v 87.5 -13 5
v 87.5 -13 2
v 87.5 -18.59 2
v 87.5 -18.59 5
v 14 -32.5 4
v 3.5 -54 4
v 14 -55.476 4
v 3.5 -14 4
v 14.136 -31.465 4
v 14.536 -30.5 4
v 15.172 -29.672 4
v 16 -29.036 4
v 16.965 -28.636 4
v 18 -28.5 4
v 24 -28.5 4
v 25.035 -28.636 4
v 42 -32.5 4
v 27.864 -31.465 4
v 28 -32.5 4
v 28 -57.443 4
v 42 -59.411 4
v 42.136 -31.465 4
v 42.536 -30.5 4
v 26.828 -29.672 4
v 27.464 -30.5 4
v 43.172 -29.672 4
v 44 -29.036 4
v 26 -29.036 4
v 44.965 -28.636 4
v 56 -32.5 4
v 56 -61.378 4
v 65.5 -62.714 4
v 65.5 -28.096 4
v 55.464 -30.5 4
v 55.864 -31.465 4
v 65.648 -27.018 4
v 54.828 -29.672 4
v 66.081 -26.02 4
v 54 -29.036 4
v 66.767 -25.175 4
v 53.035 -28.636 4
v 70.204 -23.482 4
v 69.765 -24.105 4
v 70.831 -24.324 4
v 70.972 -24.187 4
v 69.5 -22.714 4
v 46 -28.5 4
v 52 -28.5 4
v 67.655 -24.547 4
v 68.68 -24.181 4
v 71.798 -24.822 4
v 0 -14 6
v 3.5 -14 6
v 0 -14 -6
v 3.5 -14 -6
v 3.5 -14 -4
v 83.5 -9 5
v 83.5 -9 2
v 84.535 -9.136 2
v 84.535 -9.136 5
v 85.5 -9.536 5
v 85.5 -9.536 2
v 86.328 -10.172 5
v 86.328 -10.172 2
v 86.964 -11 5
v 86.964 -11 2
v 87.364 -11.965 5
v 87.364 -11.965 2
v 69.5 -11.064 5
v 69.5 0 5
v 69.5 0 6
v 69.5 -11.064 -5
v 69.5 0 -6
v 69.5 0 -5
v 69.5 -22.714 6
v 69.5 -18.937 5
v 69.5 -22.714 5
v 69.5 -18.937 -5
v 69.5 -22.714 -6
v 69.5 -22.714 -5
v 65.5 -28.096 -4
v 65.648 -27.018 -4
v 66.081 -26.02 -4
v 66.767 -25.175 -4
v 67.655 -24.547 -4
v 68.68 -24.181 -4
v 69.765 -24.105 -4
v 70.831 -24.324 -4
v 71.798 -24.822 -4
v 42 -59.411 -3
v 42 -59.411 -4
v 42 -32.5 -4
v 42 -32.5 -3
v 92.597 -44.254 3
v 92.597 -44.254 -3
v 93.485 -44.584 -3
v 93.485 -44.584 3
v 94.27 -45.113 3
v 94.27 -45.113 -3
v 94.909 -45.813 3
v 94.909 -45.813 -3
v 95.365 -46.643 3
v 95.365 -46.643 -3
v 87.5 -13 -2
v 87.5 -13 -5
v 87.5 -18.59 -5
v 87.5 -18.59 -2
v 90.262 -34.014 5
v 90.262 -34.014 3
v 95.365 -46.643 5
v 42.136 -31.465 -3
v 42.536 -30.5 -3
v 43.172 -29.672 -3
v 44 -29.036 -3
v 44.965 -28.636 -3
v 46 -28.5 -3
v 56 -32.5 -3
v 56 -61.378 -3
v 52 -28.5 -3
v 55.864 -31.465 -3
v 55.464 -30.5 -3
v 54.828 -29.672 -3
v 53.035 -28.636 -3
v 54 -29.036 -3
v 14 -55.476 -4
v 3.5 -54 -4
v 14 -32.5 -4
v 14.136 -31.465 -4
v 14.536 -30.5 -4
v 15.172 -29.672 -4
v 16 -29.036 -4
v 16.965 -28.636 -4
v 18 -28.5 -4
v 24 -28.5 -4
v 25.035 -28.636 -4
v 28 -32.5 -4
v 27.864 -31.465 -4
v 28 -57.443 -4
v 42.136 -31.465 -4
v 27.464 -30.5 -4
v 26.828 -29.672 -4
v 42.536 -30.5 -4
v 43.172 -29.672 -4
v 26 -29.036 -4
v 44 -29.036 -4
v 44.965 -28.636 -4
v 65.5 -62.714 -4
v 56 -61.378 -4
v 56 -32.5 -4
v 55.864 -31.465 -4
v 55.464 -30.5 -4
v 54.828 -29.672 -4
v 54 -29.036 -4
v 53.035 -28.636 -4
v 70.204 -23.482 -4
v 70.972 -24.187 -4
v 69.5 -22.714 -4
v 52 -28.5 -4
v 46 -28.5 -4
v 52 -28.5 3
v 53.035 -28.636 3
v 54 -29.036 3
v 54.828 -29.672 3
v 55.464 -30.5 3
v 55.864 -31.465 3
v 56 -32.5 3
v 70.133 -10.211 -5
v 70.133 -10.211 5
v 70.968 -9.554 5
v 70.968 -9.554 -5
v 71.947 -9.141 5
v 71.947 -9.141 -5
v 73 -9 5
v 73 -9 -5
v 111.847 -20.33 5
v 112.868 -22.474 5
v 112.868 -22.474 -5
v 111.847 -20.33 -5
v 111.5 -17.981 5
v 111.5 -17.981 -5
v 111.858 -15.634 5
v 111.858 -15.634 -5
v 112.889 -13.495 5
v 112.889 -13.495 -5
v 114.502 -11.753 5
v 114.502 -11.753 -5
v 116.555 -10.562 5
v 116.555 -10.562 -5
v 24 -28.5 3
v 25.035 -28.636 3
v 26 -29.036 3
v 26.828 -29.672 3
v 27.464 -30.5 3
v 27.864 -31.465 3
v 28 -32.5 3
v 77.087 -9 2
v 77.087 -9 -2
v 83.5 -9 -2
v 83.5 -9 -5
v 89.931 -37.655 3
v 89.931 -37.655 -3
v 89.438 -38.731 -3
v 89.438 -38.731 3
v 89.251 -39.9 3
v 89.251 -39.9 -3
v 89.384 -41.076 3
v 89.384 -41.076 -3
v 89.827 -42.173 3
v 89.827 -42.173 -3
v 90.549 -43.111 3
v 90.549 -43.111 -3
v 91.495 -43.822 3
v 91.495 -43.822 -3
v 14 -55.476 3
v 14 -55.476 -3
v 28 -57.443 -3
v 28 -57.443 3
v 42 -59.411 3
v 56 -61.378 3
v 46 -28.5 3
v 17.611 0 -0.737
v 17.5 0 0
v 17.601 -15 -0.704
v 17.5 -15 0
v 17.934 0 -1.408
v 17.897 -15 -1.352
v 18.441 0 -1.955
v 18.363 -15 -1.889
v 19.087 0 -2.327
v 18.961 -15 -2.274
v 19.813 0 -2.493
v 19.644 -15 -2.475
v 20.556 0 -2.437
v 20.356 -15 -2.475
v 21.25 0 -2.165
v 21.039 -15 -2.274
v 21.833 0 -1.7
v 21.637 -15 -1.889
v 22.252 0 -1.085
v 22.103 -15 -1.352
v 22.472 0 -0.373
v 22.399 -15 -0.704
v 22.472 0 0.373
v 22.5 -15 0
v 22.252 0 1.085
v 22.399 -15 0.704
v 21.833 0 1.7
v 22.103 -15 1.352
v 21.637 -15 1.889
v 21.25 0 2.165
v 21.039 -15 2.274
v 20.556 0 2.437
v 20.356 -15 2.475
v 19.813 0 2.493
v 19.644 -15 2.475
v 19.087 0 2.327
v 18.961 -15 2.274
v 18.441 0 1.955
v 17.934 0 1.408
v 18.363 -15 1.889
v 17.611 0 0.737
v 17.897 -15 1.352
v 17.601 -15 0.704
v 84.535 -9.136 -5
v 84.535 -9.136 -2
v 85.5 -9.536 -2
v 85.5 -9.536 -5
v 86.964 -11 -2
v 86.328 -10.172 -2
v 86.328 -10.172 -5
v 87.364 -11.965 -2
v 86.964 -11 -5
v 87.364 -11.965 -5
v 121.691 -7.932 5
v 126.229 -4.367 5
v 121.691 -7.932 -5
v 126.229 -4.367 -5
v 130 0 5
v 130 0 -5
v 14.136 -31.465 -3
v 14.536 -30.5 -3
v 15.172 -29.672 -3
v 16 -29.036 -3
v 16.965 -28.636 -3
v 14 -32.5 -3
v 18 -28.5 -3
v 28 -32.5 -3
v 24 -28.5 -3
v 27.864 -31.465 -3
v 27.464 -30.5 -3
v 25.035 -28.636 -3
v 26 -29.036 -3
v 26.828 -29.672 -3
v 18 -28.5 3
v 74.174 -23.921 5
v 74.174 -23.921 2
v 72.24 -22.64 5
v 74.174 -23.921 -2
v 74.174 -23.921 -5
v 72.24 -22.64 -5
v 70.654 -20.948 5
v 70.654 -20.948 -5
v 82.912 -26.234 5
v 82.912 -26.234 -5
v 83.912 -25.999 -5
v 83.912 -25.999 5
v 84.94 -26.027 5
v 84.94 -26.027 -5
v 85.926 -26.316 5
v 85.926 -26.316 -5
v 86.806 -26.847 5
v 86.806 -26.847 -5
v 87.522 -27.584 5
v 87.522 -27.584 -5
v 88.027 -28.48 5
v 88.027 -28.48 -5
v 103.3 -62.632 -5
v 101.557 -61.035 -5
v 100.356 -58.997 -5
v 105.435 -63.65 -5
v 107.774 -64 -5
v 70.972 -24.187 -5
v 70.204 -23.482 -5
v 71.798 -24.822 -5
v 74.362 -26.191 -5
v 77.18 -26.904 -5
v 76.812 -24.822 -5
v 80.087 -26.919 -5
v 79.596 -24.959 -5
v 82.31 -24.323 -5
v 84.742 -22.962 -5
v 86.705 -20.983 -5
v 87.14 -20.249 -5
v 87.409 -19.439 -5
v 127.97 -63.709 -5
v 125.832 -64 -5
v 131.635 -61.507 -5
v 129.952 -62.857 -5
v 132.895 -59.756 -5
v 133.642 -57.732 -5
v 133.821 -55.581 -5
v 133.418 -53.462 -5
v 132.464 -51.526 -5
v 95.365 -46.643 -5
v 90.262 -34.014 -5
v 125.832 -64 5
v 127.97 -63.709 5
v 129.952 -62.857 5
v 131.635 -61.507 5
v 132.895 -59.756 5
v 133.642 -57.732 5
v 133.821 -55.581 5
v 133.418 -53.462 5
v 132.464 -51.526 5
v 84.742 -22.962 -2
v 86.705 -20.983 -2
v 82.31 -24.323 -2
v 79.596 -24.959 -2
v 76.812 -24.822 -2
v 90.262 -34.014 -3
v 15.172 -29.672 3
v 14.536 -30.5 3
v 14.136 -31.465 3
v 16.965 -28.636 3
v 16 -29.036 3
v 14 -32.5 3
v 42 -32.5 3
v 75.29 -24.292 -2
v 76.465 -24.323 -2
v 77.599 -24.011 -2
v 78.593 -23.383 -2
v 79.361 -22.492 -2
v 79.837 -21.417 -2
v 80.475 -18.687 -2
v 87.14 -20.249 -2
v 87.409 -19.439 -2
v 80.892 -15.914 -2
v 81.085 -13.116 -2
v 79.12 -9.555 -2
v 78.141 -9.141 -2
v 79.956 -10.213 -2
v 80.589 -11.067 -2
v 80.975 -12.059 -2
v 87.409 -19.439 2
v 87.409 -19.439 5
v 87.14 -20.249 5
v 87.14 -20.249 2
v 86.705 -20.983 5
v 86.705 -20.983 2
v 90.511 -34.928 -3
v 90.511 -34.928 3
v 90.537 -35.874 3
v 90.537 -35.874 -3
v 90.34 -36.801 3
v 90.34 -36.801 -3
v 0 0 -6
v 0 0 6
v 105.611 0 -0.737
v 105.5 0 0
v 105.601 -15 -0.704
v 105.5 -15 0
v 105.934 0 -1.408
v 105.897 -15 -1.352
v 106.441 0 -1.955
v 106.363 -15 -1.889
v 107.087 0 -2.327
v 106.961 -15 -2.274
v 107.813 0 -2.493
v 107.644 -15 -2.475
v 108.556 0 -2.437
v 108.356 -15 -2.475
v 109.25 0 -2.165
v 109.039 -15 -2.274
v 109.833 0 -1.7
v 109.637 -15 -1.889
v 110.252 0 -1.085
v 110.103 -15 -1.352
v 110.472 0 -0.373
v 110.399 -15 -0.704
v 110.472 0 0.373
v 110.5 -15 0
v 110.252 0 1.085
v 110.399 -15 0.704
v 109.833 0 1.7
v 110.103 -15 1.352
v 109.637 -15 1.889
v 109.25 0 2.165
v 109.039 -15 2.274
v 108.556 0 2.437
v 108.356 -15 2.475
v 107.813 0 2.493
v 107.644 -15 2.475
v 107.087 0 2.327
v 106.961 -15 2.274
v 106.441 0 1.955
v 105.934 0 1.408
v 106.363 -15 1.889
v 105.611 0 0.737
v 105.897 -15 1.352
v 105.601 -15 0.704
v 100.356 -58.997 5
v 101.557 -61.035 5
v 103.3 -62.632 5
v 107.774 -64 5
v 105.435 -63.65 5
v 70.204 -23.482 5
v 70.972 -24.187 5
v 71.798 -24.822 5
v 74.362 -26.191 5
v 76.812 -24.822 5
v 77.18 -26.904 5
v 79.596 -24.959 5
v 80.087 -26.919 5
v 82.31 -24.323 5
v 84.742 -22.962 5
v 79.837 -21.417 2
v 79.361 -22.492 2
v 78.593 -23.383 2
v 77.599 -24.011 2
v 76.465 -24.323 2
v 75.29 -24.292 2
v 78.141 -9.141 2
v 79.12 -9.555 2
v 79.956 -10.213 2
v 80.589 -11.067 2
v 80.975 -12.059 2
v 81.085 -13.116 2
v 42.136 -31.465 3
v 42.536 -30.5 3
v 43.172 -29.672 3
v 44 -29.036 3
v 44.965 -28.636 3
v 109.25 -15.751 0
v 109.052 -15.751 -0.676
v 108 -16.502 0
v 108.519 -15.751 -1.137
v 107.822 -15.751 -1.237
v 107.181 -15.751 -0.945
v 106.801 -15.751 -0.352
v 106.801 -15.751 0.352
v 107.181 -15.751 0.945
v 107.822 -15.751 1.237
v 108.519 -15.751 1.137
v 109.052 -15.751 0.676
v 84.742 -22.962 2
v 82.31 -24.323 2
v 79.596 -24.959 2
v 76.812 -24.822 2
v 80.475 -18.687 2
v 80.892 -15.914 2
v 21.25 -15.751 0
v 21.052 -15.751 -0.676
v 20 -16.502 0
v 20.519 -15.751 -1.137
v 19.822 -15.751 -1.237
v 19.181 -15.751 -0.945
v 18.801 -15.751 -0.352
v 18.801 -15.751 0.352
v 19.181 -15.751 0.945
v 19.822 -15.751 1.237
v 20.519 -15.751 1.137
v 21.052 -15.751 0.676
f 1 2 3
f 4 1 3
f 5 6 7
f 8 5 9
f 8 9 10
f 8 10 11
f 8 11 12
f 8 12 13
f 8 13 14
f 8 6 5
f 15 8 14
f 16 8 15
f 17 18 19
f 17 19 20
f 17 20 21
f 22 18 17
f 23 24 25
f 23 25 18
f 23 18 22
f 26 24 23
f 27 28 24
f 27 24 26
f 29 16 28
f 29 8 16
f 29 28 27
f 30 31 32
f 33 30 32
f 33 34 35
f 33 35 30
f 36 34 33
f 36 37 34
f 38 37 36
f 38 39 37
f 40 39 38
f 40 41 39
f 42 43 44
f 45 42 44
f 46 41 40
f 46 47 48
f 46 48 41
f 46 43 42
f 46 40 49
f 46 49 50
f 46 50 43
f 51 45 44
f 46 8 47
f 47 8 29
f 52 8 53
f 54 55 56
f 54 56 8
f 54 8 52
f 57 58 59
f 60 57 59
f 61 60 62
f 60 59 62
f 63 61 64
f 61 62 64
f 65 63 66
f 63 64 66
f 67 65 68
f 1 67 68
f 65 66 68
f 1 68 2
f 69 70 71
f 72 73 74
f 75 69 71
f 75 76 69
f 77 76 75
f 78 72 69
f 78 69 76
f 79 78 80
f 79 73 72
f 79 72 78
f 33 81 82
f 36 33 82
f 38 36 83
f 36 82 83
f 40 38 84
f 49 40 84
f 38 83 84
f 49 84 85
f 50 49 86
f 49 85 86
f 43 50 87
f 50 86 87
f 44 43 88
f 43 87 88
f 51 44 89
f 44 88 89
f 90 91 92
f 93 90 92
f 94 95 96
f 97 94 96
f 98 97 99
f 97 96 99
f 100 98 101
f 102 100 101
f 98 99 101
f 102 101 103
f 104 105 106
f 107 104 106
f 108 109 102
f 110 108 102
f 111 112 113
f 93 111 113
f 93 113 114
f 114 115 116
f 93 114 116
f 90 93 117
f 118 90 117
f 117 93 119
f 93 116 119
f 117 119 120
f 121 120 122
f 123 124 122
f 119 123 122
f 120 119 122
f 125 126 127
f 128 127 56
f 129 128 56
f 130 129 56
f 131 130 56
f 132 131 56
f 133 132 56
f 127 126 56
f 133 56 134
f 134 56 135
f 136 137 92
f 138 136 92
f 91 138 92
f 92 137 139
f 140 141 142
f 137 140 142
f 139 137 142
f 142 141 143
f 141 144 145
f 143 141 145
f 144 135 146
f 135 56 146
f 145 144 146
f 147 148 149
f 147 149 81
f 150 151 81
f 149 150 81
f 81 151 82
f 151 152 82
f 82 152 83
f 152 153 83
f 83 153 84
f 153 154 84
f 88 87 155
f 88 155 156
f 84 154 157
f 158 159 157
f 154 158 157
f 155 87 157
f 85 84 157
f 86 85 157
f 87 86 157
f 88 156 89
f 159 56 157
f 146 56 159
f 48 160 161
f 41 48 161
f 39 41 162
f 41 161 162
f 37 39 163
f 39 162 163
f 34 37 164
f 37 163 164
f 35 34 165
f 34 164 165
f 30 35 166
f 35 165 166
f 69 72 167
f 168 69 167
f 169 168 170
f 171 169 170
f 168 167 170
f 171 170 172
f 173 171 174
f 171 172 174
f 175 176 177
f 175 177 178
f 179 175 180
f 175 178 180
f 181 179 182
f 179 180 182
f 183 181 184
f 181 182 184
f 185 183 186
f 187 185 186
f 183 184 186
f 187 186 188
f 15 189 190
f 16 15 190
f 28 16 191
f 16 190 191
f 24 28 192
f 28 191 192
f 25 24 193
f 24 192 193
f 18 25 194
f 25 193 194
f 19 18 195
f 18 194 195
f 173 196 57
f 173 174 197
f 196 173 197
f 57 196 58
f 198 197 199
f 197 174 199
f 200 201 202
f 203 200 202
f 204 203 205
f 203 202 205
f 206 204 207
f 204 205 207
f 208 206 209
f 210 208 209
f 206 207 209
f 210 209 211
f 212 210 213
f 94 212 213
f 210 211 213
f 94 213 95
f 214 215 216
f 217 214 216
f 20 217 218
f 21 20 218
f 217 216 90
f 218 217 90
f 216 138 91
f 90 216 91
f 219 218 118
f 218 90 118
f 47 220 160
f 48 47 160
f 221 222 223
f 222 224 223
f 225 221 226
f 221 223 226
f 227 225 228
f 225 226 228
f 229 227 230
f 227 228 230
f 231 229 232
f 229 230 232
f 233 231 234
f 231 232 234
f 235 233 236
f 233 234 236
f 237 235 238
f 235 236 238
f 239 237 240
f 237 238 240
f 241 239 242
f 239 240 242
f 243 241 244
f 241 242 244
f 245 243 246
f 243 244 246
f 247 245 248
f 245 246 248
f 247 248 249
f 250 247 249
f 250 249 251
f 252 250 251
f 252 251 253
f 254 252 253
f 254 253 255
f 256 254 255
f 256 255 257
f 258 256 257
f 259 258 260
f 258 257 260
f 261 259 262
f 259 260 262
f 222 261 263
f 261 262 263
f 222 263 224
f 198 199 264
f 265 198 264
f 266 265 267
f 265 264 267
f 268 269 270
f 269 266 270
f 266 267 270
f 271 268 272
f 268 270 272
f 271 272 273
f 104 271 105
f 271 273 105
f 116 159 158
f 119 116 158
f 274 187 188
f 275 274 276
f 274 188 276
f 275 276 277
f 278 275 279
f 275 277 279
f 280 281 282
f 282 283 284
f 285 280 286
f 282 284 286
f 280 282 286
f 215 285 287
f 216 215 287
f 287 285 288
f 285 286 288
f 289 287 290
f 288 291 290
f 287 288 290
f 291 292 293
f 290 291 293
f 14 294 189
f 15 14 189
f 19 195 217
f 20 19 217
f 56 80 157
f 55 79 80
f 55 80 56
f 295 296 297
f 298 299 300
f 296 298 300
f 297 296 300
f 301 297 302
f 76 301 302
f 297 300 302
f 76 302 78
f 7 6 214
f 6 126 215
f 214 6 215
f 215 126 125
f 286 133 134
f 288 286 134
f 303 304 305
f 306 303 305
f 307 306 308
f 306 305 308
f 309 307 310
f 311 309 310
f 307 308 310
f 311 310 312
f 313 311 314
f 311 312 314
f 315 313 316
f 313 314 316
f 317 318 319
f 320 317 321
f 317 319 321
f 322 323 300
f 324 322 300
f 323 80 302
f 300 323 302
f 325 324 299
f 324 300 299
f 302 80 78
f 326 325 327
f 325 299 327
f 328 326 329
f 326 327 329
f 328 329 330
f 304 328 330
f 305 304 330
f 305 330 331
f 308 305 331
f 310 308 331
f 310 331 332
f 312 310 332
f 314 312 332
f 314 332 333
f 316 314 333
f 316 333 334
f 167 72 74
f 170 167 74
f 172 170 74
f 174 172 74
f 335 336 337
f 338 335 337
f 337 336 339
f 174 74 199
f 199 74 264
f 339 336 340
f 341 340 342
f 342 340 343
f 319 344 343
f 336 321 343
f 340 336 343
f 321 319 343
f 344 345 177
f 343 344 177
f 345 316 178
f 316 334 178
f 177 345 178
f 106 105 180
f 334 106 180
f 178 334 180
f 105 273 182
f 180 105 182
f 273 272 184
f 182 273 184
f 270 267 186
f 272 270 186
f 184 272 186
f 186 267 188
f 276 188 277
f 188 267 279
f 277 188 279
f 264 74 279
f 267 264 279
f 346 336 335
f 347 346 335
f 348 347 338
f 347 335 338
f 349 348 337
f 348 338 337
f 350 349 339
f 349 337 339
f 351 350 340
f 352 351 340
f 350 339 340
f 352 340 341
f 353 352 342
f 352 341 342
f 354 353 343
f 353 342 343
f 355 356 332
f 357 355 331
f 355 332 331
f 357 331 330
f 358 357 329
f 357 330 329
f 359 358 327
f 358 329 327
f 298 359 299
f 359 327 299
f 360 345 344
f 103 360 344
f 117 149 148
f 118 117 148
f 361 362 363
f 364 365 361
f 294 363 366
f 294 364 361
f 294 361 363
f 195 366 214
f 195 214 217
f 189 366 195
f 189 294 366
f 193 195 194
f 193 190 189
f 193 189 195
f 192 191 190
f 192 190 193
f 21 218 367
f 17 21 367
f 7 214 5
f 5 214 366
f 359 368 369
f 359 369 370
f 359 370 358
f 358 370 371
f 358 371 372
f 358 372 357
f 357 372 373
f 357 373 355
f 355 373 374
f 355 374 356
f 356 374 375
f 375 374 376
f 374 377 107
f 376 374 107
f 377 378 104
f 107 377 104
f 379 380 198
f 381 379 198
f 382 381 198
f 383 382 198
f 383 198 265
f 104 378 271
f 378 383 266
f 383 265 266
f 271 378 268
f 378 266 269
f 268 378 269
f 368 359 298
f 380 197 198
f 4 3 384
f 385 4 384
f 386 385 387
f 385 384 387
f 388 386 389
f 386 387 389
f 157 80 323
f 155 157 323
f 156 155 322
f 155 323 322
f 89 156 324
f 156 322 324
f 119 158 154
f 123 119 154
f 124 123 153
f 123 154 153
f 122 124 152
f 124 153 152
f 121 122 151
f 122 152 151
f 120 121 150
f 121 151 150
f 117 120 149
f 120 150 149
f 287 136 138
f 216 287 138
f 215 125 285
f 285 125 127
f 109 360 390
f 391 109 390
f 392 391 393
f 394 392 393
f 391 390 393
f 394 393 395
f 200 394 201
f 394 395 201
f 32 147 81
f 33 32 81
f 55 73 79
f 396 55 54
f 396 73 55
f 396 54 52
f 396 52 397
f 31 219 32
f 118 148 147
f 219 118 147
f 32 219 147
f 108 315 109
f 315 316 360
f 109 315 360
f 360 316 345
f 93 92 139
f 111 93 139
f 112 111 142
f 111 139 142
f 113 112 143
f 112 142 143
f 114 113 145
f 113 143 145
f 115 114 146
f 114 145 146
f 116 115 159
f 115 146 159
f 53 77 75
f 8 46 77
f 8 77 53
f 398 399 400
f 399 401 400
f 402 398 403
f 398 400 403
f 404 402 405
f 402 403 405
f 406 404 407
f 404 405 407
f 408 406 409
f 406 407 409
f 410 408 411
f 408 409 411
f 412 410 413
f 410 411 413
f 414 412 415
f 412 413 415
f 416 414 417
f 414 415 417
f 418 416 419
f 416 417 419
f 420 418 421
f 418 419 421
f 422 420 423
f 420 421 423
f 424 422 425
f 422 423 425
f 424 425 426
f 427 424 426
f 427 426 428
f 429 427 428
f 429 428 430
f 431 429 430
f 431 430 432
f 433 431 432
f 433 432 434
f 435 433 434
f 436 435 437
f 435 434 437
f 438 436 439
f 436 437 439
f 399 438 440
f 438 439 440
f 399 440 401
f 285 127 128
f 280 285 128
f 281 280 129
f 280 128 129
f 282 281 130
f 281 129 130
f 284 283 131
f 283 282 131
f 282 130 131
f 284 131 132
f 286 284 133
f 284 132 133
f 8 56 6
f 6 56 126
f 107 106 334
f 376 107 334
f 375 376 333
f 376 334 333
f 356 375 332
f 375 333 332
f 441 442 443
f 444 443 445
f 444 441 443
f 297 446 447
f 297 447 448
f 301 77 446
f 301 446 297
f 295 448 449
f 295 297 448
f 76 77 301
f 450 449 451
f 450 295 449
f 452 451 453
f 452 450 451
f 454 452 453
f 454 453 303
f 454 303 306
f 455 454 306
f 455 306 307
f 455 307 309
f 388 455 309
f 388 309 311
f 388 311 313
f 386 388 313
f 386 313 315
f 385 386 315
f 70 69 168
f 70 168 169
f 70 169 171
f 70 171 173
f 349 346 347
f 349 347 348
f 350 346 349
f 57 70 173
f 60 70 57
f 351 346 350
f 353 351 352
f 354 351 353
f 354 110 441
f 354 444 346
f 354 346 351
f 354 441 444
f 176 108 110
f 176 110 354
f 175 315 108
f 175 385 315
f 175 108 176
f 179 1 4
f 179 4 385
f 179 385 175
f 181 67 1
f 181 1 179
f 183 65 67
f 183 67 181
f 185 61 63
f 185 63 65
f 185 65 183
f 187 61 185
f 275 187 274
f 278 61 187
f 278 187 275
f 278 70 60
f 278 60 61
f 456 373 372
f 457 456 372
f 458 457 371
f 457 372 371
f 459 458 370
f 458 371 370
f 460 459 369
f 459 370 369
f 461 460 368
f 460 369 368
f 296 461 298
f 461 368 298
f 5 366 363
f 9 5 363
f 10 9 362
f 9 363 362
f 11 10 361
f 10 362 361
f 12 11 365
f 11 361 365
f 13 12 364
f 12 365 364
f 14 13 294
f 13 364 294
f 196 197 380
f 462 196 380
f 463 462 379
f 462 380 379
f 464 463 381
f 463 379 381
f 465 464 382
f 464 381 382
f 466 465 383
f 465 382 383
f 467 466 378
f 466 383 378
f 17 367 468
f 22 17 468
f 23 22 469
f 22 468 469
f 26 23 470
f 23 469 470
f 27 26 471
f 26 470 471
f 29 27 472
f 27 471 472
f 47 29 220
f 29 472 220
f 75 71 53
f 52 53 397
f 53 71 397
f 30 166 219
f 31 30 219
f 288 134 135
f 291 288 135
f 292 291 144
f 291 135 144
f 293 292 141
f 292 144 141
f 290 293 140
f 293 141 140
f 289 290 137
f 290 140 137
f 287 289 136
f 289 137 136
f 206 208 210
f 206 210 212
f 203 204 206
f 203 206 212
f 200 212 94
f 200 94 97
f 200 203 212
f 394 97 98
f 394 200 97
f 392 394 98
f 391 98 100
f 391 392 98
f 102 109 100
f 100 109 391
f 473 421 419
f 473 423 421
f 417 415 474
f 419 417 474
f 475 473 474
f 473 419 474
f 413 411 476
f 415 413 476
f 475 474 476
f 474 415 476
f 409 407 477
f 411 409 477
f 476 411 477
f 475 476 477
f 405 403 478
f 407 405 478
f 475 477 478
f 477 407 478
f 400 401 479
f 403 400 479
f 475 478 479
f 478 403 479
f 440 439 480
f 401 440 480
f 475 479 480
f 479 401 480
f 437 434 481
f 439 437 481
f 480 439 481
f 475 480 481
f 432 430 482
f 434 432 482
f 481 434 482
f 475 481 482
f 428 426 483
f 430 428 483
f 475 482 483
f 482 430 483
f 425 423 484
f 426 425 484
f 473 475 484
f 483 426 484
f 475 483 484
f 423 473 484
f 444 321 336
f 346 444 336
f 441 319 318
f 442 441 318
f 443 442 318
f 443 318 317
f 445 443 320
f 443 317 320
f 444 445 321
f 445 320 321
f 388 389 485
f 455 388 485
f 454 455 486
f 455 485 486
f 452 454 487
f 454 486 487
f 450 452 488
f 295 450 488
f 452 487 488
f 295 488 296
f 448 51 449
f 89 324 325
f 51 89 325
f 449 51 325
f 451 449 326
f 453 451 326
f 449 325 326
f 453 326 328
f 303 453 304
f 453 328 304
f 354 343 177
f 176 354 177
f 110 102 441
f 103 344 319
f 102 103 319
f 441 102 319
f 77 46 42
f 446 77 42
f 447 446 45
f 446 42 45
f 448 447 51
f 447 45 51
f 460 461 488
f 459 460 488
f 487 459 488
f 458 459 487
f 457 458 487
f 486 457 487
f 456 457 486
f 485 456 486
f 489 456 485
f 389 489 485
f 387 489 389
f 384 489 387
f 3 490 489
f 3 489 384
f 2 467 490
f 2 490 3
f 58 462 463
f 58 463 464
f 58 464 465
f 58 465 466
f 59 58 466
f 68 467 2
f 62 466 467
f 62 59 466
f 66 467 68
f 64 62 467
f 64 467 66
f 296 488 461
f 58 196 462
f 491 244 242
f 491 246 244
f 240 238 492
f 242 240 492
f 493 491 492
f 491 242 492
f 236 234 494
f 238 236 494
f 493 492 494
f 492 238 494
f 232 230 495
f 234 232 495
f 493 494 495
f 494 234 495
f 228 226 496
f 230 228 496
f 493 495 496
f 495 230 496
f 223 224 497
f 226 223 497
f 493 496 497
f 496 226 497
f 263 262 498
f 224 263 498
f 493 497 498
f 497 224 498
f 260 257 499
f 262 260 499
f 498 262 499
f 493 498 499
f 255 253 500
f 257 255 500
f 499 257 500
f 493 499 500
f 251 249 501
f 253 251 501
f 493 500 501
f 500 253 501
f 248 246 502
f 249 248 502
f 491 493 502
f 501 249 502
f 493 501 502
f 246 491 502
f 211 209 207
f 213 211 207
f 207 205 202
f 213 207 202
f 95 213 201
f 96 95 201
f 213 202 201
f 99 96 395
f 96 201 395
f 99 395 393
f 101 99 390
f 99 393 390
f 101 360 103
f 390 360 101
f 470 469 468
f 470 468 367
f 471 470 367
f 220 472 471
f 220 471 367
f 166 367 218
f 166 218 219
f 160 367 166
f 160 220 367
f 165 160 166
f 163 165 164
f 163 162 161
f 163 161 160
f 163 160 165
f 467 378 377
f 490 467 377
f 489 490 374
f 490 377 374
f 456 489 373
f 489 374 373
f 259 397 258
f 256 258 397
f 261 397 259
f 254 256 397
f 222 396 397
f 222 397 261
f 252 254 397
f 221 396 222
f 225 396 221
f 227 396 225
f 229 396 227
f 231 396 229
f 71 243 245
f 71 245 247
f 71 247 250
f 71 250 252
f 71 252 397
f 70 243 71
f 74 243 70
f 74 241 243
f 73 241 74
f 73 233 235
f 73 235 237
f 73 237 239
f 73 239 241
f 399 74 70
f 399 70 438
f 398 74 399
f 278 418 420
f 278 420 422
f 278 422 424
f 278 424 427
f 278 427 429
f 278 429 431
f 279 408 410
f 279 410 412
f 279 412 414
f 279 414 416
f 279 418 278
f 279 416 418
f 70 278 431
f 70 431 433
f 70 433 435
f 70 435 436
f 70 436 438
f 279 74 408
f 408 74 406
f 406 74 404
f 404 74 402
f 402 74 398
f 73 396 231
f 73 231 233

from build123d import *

# Parameters (mm, degrees)
EXTRUDE_8_DEPTH        = 4
EXTRUDE_8_DEPTH_BACK   = 4
EXTRUDE_9_DEPTH        = 5
EXTRUDE_9_DEPTH_BACK   = 5
EXTRUDE_10_DEPTH       = 2
EXTRUDE_10_DEPTH_BACK  = 2
EXTRUDE_11_DEPTH       = 3
EXTRUDE_11_DEPTH_BACK  = 3
EXTRUDE_12_DEPTH       = 3
EXTRUDE_12_DEPTH_BACK  = 3
EXTRUDE_13_DEPTH       = 6
EXTRUDE_13_DEPTH_BACK  = 6
HOLE_WIZARD_M6_2_D     = 5
HOLE_WIZARD_M6_2_DEPTH = 15
HOLE_WIZARD_M6_2_TIP   = 1.502151548


with BuildPart() as part:
    # 草图1 → 凸台-拉伸8 (new, two sides: drawn at the far end of the back side and taken through both)
    with BuildSketch(Plane.XY.offset(-EXTRUDE_8_DEPTH_BACK)):
        with BuildLine():
            Line((69.5, 0), (0, 0))
            Line((0, 0), (0, -14))
            Line((0, -14), (3.5, -14))
            Line((3.5, -14), (3.5, -54))
            Line((3.5, -54), (14, -55.475678764))
            Line((14, -55.475678764), (14, -32.5))
            ThreePointArc((14, -32.5), (15.171572875, -29.671572875), (18, -28.5))
            Line((18, -28.5), (24, -28.5))
            ThreePointArc((24, -28.5), (26.828427125, -29.671572875), (28, -32.5))
            Line((28, -32.5), (28, -57.44325045))
            Line((28, -57.44325045), (42, -59.410822136))
            Line((42, -59.410822136), (42, -32.5))
            ThreePointArc((42, -32.5), (43.171572875, -29.671572875), (46, -28.5))
            Line((46, -28.5), (52, -28.5))
            ThreePointArc((52, -28.5), (54.828427125, -29.671572875), (56, -32.5))
            Line((56, -32.5), (56, -61.378393822))
            Line((56, -61.378393822), (65.5, -62.713531752))
            Line((65.5, -62.713531752), (65.5, -28.095746335))
            ThreePointArc((65.5, -28.095746335), (67.655069896, -24.546629134), (71.798116456, -24.821809752))
            ThreePointArc((71.798116456, -24.821809752), (70.580276552, -23.842645827), (69.5, -22.713531752))
            Line((69.5, -22.713531752), (69.5, -18.936822587))
            ThreePointArc((69.5, -18.936822587), (69.221207402, -18.208623367), (69, -17.460915736))
            Line((69, -17.460915736), (69, -13))
            ThreePointArc((69, -13), (69.127016654, -12), (69.5, -11.063508327))
            Line((69.5, -11.063508327), (69.5, 0))
        make_face()
    extrude(amount=EXTRUDE_8_DEPTH + EXTRUDE_8_DEPTH_BACK)

    # 草图1<10> → 凸台-拉伸9 (add, two sides: drawn at the far end of the back side and taken through both)
    with BuildSketch(Plane.XY.offset(-EXTRUDE_9_DEPTH_BACK)):
        with BuildLine():
            Line((130, 0), (69.5, 0))
            Line((69.5, 0), (69.5, -11.063508327))
            ThreePointArc((69.5, -11.063508327), (70.968493994, -9.554280431), (73, -9))
            Line((73, -9), (77.08693273, -9))
            Line((77.08693273, -9), (83.5, -9))
            ThreePointArc((83.5, -9), (86.328427125, -10.171572875), (87.5, -13))
            Line((87.5, -13), (87.5, -18.58993247))
            ThreePointArc((87.5, -18.58993247), (87.296056581, -19.850866423), (86.705022784, -20.983220784))
            ThreePointArc((86.705022784, -20.983220784), (80.974921845, -24.736035873), (74.173945542, -23.920929013))
            ThreePointArc((74.173945542, -23.920929013), (71.398076595, -21.840459472), (69.5, -18.936822587))
            Line((69.5, -18.936822587), (69.5, -22.713531752))
            ThreePointArc((69.5, -22.713531752), (70.580276552, -23.842645827), (71.798116456, -24.821809752))
            ThreePointArc((71.798116456, -24.821809752), (77.179945202, -26.904296761), (82.91155309, -26.233846298))
            ThreePointArc((82.91155309, -26.233846298), (85.926197724, -26.316026977), (88.02665093, -28.480035357))
            Line((88.02665093, -28.480035357), (90.262355313, -34.013597882))
            Line((90.262355313, -34.013597882), (95.364949439, -46.642961524))
            Line((95.364949439, -46.642961524), (100.356245485, -58.996852747))
            ThreePointArc((100.356245485, -58.996852747), (103.300173094, -62.63230058), (107.773716321, -64))
            Line((107.773716321, -64), (125.831836464, -64))
            ThreePointArc((125.831836464, -64), (132.895417207, -59.755772502), (132.464137044, -51.526456772))
            Line((132.464137044, -51.526456772), (112.86769942, -22.473543228))
            ThreePointArc((112.86769942, -22.473543228), (111.857848283, -15.634092747), (116.555476326, -10.561600956))
            ThreePointArc((116.555476326, -10.561600956), (124.046039774, -6.258819743), (130, 0))
        make_face()
    extrude(amount=EXTRUDE_9_DEPTH + EXTRUDE_9_DEPTH_BACK)

    # 草图1<11> → 凸台-拉伸10 (add, two sides: drawn at the far end of the back side and taken through both)
    with BuildSketch(Plane.XY.offset(-EXTRUDE_10_DEPTH_BACK)):
        with BuildLine():
            ThreePointArc((79.837012191, -21.417403525), (77.598679354, -24.011007569), (74.173945542, -23.920929013))
            ThreePointArc((74.173945542, -23.920929013), (80.974921845, -24.736035873), (86.705022784, -20.983220784))
            ThreePointArc((86.705022784, -20.983220784), (87.296056581, -19.850866423), (87.5, -18.58993247))
            Line((87.5, -18.58993247), (87.5, -13))
            ThreePointArc((87.5, -13), (86.328427125, -10.171572875), (83.5, -9))
            Line((83.5, -9), (77.08693273, -9))
            ThreePointArc((77.08693273, -9), (79.956123916, -10.212933095), (81.08524663, -13.116129032))
            ThreePointArc((81.08524663, -13.116129032), (80.710908742, -17.304324748), (79.837012191, -21.417403525))
        make_face()
    extrude(amount=EXTRUDE_10_DEPTH + EXTRUDE_10_DEPTH_BACK)

    # 草图1<12> → 凸台-拉伸11 (add, two sides: drawn at the far end of the back side and taken through both)
    with BuildSketch(Plane.XY.offset(-EXTRUDE_11_DEPTH_BACK)):
        with BuildLine():
            Line((95.364949439, -46.642961524), (90.262355313, -34.013597882))
            ThreePointArc((90.262355313, -34.013597882), (90.537164852, -35.874473659), (89.931018667, -37.655194228))
            ThreePointArc((89.931018667, -37.655194228), (89.568508885, -41.63940278), (92.596940419, -44.25358211))
            ThreePointArc((92.596940419, -44.25358211), (94.269957944, -45.113460767), (95.364949439, -46.642961524))
        make_face()
    extrude(amount=EXTRUDE_11_DEPTH + EXTRUDE_11_DEPTH_BACK)

    # 草图1<13> → 凸台-拉伸12 (add, two sides: drawn at the far end of the back side and taken through both)
    with BuildSketch(Plane.XY.offset(-EXTRUDE_12_DEPTH_BACK)):
        with BuildLine():
            Line((14, -32.5), (14, -55.475678764))
            Line((14, -55.475678764), (28, -57.44325045))
            Line((28, -57.44325045), (28, -32.5))
            ThreePointArc((28, -32.5), (26.828427125, -29.671572875), (24, -28.5))
            Line((24, -28.5), (18, -28.5))
            ThreePointArc((18, -28.5), (15.171572875, -29.671572875), (14, -32.5))
        make_face()
        with BuildLine():
            Line((42, -32.5), (42, -59.410822136))
            Line((42, -59.410822136), (56, -61.378393822))
            Line((56, -61.378393822), (56, -32.5))
            ThreePointArc((56, -32.5), (54.828427125, -29.671572875), (52, -28.5))
            Line((52, -28.5), (46, -28.5))
            ThreePointArc((46, -28.5), (43.171572875, -29.671572875), (42, -32.5))
        make_face()
    extrude(amount=EXTRUDE_12_DEPTH + EXTRUDE_12_DEPTH_BACK)

    # 草图13 → 凸台-拉伸13 (add, two sides: drawn at the far end of the back side and taken through both)
    with BuildSketch(Plane.XY.offset(-EXTRUDE_13_DEPTH_BACK)):
        Polygon((69.5, 0), (69.5, -22.713531752), (3.5, -14), (0, -14), (0, 0), align=None)
    extrude(amount=EXTRUDE_13_DEPTH + EXTRUDE_13_DEPTH_BACK)

    # M6 螺纹孔2
    with Locations(Plane(origin=(0, 0, 0), x_dir=(1, 0, 0), z_dir=(0, 1, 0))):
        with Locations((20, 0), (108, 0)):
            Hole(HOLE_WIZARD_M6_2_D / 2, depth=HOLE_WIZARD_M6_2_DEPTH)
            with Locations((0, 0, -(HOLE_WIZARD_M6_2_DEPTH + HOLE_WIZARD_M6_2_TIP / 2))):  # 118° drill point
                Cone(0, HOLE_WIZARD_M6_2_D / 2, HOLE_WIZARD_M6_2_TIP, mode=Mode.SUBTRACT)


solid = part.part
